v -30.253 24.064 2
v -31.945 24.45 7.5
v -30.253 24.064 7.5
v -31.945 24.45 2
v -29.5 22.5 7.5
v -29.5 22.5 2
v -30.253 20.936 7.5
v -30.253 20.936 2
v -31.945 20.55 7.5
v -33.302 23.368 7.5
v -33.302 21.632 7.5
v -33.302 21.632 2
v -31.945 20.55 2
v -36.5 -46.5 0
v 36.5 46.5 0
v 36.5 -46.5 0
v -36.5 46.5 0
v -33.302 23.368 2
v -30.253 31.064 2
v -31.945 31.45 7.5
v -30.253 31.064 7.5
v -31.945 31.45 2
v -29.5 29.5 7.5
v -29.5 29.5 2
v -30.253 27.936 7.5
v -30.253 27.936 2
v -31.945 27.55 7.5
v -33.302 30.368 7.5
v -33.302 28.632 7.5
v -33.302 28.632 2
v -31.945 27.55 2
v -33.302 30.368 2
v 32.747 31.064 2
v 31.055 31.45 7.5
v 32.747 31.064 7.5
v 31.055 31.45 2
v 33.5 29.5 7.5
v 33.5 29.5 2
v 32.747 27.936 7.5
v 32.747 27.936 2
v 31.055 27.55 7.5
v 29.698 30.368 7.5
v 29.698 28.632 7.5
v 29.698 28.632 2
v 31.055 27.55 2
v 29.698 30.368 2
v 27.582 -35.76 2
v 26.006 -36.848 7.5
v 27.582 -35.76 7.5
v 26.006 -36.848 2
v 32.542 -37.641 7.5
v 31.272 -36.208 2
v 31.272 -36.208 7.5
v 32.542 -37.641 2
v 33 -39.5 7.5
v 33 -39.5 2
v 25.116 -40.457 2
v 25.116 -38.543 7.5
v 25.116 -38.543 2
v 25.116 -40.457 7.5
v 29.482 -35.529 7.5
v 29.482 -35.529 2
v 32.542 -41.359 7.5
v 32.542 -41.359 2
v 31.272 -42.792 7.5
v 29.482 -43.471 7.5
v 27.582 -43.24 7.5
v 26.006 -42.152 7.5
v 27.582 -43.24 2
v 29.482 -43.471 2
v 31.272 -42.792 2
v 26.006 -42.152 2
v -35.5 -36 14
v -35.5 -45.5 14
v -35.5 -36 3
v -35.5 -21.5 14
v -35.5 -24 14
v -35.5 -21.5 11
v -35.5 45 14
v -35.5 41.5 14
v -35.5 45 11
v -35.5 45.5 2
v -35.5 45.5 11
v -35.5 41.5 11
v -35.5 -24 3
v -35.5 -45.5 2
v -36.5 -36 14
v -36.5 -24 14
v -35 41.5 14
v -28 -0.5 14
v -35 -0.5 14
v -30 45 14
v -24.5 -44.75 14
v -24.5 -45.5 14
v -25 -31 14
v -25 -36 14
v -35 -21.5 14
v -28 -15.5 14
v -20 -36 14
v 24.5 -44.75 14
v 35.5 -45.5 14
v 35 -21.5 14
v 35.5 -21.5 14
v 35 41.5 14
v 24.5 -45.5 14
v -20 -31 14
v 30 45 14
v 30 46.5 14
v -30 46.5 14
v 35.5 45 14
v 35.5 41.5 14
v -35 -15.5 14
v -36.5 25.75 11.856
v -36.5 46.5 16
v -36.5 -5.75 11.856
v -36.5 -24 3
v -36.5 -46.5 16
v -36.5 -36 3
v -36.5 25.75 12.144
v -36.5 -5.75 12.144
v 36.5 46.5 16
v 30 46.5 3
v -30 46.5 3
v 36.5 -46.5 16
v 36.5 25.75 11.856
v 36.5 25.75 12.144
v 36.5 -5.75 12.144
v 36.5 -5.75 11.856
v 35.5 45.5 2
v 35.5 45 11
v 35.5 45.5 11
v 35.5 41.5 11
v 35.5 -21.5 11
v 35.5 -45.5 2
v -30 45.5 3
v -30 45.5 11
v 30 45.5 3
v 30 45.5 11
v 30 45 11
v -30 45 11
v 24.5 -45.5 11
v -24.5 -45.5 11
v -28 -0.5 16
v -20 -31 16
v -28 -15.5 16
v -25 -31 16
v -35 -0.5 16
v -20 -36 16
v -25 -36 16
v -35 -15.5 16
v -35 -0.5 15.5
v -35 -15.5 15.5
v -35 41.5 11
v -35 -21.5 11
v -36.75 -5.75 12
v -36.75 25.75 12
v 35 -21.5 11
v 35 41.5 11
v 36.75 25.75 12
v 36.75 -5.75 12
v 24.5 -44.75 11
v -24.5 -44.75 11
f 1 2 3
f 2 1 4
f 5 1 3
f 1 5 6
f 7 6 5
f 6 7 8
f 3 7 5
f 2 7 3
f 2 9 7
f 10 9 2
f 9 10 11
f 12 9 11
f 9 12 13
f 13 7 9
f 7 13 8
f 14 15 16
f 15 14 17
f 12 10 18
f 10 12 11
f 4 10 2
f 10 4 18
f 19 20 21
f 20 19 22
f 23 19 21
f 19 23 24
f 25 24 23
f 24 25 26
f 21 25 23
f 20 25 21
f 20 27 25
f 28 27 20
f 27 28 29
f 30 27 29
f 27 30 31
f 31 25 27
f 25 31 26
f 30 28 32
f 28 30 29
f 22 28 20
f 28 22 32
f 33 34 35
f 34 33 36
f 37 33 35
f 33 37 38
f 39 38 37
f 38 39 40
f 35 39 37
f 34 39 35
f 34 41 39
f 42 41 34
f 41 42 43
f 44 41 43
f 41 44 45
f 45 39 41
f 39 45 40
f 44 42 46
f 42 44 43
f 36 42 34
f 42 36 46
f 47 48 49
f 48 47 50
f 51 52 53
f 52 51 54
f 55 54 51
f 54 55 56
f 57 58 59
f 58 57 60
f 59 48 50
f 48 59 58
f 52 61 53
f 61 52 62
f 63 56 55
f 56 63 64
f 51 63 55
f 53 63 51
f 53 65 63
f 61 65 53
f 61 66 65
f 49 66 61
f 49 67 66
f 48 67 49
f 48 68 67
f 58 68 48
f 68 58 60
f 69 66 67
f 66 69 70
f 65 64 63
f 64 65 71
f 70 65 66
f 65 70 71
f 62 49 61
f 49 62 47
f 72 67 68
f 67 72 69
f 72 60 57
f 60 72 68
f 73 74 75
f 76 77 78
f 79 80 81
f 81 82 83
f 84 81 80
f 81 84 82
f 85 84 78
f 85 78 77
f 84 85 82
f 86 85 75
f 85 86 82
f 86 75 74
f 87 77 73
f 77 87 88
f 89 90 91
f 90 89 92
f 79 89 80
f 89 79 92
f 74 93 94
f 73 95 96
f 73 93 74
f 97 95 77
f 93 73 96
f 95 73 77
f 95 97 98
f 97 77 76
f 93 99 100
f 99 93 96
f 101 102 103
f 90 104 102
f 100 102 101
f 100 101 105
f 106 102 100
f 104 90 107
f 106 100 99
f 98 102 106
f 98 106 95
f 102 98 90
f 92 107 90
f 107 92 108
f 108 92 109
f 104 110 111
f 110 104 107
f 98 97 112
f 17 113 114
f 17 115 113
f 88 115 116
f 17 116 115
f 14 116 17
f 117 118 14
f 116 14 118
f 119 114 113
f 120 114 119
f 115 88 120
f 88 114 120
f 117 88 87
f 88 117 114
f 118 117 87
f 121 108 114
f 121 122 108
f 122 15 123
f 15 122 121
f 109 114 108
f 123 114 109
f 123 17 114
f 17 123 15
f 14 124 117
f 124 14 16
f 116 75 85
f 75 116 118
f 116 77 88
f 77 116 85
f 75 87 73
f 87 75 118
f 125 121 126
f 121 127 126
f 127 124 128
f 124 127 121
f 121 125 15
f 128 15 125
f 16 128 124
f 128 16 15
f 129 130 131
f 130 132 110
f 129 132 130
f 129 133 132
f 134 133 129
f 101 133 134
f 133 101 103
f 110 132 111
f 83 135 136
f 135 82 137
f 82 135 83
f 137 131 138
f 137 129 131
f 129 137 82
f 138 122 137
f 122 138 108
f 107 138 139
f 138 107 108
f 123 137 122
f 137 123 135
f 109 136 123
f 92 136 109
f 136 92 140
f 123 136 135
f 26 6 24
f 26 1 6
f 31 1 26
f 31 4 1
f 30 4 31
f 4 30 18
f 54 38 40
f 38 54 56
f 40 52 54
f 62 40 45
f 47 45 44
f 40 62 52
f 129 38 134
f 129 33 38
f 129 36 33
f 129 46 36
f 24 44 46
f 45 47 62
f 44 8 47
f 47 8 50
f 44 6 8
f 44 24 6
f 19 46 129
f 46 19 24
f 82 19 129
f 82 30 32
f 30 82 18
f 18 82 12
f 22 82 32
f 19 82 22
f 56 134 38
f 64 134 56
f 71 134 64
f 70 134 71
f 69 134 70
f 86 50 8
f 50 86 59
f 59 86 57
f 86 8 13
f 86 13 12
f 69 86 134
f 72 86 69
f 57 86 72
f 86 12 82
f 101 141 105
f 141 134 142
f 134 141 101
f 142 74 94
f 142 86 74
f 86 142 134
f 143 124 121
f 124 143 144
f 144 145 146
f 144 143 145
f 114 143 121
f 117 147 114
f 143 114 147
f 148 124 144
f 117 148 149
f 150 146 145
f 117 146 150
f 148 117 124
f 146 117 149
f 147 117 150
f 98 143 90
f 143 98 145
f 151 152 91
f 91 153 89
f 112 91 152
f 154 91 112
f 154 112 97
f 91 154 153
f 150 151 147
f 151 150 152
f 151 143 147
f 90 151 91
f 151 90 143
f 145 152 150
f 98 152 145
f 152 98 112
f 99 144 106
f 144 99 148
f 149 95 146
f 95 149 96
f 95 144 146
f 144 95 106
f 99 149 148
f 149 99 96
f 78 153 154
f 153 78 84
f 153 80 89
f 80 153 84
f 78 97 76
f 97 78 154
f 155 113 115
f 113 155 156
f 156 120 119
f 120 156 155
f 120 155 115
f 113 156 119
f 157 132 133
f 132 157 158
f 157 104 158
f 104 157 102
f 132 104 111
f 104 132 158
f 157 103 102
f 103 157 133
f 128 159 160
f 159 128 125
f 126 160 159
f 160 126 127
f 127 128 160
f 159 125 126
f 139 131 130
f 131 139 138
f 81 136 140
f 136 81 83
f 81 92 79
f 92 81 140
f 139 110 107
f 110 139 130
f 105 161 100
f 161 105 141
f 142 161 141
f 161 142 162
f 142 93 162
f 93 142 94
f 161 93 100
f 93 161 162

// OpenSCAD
board_height = 90;
board_width  = 70;
case_border = 1.5;
pin_height = 6;

case_height = 14;
cart_wall_corners = 5;
usb_cutout_width = 12;


top_walls = 3;
top_wall_factor = 0.70;
top_side_wall_offset = 10;

indent_factor = 0.5;

module bottom(x = 0, y = 0, z = 0){
    pin_radius_small = 2;
    pin_radius_large = 4;
    
    translate([x-(board_width+case_border*2)/2,y-(board_height+case_border*2)/2,z]){
        cube([board_width+case_border*2,board_height+case_border*2,2]);
        color("blue"){
            translate([case_border,case_border])
                cube([board_width,board_height,2]);
        }
        color("red"){
            translate([3.5+case_border,case_border+board_height-15.5-7,0]){
                cylinder(pin_height+case_border, pin_radius_small, pin_radius_small);
            }

            translate([3.5+case_border,case_border+board_height-15.5,0]){
                cylinder(pin_height+case_border, pin_radius_small, pin_radius_small);
            }
            translate([case_border+board_width-3.5,case_border+board_height-15.5,0]){
                cylinder(pin_height+case_border, pin_radius_small, pin_radius_small);
            }


            translate([case_border+board_width-6,case_border+5.5,0]){
                cylinder(pin_height+case_border, pin_radius_large, pin_radius_large);
            }
        }
        
        /*
            Sidewalls
        */
        translate([0,0,0]){
            difference(){
                cube([1,board_height+case_border*2,case_height]); //left
                
                translate([-1,case_border+9,case_border*2]){
                    cube([3,usb_cutout_width,8+10]);
                }


                translate([0.5,indent_pos,case_height-top_walls+1/2])
                    cube([1.5,board_height*top_wall_factor*indent_factor+4,1]);
            }
        }
        
        indent_pos = case_border+(board_height*(1-top_wall_factor)/2)+top_side_wall_offset + 15;
    
        translate([board_width+case_border*2-1,0,0]){
            difference(){
                cube([1,board_height+case_border*2,case_height]); //right
                
                translate([-1,indent_pos,case_height-top_walls+1/2])
                    cube([1.5,board_height*top_wall_factor*indent_factor+4,1]);
            }
        }

        translate([0,0,0])
            cube([board_width+case_border*2,1,case_height]); //bottom


        translate([0,case_border*2+board_height-1,0]){
            difference(){
                cube([board_width+case_border*2,1,case_height]); //top
                
                
                translate([case_border+cart_wall_corners,-1,case_border*2]){
                    cube([board_width-cart_wall_corners*2,3,case_height]);
                }
            }
        }
    }
}


module top(x = 0, y = 0, z = 0){
    switch_cutout_width = 7;
    switch_cutout_height = 15;

    translate([x-(board_width+case_border*2)/2,y-(board_height+case_border*2)/2,z+case_height]){
        difference(){
            color("purple")
            cube([board_width+case_border*2,board_height+case_border*2,2]);

            //power selector
            translate([case_border,case_border+37-switch_cutout_height/2,-5])
                cube([switch_cutout_width,switch_cutout_height,10]);
            
            //bootsel
            translate([case_border+10,case_border+9,-5]){
                cube([5,5,10]);                
            }
        }

        
        /*
            Sidewalls
        */
        translate([case_border-1,case_border+(board_height*(1-top_wall_factor)/2)+top_side_wall_offset,-top_walls]){
            color("green")
            cube([1,board_height*top_wall_factor,case_border+top_walls]); //left                
            translate([0.25,board_height*top_wall_factor-(1-indent_factor)*board_height*top_wall_factor/2,1]){
                rotate([0,180,0])
                rotate([90,0,0])
                color("blue")
                cylinder(board_height*top_wall_factor*indent_factor,1,1,$fn=3);
            }
        }

        translate([board_width+case_border,case_border+(board_height*(1-top_wall_factor)/2)+top_side_wall_offset,-top_walls]){
            color("green")
            cube([1,board_height*top_wall_factor,case_border+top_walls]); //right
            translate([0.75,board_height*top_wall_factor-(1-indent_factor)*board_height*top_wall_factor/2,1]){
                rotate([90,0,0])
                color("blue")
                cylinder(board_height*top_wall_factor*indent_factor,1,1,$fn=3);
            }
        }

        translate([case_border+(board_width*(1-top_wall_factor))/2,case_border/2,-top_walls])
            cube([board_width*top_wall_factor,1,case_border+top_walls]); //bottom

        color("grey")
        translate([case_border/2,board_height+case_border,-top_walls]){
            difference(){
                cube([board_width+case_border,1,case_border+top_walls]); //top
                
                translate([case_border/2+cart_wall_corners,-1,-1])
                    cube([board_width-cart_wall_corners*2,3,case_border+top_walls+3]);
            }
        }
    }
}




bottom(0,0,0);
top(0,0,0);
